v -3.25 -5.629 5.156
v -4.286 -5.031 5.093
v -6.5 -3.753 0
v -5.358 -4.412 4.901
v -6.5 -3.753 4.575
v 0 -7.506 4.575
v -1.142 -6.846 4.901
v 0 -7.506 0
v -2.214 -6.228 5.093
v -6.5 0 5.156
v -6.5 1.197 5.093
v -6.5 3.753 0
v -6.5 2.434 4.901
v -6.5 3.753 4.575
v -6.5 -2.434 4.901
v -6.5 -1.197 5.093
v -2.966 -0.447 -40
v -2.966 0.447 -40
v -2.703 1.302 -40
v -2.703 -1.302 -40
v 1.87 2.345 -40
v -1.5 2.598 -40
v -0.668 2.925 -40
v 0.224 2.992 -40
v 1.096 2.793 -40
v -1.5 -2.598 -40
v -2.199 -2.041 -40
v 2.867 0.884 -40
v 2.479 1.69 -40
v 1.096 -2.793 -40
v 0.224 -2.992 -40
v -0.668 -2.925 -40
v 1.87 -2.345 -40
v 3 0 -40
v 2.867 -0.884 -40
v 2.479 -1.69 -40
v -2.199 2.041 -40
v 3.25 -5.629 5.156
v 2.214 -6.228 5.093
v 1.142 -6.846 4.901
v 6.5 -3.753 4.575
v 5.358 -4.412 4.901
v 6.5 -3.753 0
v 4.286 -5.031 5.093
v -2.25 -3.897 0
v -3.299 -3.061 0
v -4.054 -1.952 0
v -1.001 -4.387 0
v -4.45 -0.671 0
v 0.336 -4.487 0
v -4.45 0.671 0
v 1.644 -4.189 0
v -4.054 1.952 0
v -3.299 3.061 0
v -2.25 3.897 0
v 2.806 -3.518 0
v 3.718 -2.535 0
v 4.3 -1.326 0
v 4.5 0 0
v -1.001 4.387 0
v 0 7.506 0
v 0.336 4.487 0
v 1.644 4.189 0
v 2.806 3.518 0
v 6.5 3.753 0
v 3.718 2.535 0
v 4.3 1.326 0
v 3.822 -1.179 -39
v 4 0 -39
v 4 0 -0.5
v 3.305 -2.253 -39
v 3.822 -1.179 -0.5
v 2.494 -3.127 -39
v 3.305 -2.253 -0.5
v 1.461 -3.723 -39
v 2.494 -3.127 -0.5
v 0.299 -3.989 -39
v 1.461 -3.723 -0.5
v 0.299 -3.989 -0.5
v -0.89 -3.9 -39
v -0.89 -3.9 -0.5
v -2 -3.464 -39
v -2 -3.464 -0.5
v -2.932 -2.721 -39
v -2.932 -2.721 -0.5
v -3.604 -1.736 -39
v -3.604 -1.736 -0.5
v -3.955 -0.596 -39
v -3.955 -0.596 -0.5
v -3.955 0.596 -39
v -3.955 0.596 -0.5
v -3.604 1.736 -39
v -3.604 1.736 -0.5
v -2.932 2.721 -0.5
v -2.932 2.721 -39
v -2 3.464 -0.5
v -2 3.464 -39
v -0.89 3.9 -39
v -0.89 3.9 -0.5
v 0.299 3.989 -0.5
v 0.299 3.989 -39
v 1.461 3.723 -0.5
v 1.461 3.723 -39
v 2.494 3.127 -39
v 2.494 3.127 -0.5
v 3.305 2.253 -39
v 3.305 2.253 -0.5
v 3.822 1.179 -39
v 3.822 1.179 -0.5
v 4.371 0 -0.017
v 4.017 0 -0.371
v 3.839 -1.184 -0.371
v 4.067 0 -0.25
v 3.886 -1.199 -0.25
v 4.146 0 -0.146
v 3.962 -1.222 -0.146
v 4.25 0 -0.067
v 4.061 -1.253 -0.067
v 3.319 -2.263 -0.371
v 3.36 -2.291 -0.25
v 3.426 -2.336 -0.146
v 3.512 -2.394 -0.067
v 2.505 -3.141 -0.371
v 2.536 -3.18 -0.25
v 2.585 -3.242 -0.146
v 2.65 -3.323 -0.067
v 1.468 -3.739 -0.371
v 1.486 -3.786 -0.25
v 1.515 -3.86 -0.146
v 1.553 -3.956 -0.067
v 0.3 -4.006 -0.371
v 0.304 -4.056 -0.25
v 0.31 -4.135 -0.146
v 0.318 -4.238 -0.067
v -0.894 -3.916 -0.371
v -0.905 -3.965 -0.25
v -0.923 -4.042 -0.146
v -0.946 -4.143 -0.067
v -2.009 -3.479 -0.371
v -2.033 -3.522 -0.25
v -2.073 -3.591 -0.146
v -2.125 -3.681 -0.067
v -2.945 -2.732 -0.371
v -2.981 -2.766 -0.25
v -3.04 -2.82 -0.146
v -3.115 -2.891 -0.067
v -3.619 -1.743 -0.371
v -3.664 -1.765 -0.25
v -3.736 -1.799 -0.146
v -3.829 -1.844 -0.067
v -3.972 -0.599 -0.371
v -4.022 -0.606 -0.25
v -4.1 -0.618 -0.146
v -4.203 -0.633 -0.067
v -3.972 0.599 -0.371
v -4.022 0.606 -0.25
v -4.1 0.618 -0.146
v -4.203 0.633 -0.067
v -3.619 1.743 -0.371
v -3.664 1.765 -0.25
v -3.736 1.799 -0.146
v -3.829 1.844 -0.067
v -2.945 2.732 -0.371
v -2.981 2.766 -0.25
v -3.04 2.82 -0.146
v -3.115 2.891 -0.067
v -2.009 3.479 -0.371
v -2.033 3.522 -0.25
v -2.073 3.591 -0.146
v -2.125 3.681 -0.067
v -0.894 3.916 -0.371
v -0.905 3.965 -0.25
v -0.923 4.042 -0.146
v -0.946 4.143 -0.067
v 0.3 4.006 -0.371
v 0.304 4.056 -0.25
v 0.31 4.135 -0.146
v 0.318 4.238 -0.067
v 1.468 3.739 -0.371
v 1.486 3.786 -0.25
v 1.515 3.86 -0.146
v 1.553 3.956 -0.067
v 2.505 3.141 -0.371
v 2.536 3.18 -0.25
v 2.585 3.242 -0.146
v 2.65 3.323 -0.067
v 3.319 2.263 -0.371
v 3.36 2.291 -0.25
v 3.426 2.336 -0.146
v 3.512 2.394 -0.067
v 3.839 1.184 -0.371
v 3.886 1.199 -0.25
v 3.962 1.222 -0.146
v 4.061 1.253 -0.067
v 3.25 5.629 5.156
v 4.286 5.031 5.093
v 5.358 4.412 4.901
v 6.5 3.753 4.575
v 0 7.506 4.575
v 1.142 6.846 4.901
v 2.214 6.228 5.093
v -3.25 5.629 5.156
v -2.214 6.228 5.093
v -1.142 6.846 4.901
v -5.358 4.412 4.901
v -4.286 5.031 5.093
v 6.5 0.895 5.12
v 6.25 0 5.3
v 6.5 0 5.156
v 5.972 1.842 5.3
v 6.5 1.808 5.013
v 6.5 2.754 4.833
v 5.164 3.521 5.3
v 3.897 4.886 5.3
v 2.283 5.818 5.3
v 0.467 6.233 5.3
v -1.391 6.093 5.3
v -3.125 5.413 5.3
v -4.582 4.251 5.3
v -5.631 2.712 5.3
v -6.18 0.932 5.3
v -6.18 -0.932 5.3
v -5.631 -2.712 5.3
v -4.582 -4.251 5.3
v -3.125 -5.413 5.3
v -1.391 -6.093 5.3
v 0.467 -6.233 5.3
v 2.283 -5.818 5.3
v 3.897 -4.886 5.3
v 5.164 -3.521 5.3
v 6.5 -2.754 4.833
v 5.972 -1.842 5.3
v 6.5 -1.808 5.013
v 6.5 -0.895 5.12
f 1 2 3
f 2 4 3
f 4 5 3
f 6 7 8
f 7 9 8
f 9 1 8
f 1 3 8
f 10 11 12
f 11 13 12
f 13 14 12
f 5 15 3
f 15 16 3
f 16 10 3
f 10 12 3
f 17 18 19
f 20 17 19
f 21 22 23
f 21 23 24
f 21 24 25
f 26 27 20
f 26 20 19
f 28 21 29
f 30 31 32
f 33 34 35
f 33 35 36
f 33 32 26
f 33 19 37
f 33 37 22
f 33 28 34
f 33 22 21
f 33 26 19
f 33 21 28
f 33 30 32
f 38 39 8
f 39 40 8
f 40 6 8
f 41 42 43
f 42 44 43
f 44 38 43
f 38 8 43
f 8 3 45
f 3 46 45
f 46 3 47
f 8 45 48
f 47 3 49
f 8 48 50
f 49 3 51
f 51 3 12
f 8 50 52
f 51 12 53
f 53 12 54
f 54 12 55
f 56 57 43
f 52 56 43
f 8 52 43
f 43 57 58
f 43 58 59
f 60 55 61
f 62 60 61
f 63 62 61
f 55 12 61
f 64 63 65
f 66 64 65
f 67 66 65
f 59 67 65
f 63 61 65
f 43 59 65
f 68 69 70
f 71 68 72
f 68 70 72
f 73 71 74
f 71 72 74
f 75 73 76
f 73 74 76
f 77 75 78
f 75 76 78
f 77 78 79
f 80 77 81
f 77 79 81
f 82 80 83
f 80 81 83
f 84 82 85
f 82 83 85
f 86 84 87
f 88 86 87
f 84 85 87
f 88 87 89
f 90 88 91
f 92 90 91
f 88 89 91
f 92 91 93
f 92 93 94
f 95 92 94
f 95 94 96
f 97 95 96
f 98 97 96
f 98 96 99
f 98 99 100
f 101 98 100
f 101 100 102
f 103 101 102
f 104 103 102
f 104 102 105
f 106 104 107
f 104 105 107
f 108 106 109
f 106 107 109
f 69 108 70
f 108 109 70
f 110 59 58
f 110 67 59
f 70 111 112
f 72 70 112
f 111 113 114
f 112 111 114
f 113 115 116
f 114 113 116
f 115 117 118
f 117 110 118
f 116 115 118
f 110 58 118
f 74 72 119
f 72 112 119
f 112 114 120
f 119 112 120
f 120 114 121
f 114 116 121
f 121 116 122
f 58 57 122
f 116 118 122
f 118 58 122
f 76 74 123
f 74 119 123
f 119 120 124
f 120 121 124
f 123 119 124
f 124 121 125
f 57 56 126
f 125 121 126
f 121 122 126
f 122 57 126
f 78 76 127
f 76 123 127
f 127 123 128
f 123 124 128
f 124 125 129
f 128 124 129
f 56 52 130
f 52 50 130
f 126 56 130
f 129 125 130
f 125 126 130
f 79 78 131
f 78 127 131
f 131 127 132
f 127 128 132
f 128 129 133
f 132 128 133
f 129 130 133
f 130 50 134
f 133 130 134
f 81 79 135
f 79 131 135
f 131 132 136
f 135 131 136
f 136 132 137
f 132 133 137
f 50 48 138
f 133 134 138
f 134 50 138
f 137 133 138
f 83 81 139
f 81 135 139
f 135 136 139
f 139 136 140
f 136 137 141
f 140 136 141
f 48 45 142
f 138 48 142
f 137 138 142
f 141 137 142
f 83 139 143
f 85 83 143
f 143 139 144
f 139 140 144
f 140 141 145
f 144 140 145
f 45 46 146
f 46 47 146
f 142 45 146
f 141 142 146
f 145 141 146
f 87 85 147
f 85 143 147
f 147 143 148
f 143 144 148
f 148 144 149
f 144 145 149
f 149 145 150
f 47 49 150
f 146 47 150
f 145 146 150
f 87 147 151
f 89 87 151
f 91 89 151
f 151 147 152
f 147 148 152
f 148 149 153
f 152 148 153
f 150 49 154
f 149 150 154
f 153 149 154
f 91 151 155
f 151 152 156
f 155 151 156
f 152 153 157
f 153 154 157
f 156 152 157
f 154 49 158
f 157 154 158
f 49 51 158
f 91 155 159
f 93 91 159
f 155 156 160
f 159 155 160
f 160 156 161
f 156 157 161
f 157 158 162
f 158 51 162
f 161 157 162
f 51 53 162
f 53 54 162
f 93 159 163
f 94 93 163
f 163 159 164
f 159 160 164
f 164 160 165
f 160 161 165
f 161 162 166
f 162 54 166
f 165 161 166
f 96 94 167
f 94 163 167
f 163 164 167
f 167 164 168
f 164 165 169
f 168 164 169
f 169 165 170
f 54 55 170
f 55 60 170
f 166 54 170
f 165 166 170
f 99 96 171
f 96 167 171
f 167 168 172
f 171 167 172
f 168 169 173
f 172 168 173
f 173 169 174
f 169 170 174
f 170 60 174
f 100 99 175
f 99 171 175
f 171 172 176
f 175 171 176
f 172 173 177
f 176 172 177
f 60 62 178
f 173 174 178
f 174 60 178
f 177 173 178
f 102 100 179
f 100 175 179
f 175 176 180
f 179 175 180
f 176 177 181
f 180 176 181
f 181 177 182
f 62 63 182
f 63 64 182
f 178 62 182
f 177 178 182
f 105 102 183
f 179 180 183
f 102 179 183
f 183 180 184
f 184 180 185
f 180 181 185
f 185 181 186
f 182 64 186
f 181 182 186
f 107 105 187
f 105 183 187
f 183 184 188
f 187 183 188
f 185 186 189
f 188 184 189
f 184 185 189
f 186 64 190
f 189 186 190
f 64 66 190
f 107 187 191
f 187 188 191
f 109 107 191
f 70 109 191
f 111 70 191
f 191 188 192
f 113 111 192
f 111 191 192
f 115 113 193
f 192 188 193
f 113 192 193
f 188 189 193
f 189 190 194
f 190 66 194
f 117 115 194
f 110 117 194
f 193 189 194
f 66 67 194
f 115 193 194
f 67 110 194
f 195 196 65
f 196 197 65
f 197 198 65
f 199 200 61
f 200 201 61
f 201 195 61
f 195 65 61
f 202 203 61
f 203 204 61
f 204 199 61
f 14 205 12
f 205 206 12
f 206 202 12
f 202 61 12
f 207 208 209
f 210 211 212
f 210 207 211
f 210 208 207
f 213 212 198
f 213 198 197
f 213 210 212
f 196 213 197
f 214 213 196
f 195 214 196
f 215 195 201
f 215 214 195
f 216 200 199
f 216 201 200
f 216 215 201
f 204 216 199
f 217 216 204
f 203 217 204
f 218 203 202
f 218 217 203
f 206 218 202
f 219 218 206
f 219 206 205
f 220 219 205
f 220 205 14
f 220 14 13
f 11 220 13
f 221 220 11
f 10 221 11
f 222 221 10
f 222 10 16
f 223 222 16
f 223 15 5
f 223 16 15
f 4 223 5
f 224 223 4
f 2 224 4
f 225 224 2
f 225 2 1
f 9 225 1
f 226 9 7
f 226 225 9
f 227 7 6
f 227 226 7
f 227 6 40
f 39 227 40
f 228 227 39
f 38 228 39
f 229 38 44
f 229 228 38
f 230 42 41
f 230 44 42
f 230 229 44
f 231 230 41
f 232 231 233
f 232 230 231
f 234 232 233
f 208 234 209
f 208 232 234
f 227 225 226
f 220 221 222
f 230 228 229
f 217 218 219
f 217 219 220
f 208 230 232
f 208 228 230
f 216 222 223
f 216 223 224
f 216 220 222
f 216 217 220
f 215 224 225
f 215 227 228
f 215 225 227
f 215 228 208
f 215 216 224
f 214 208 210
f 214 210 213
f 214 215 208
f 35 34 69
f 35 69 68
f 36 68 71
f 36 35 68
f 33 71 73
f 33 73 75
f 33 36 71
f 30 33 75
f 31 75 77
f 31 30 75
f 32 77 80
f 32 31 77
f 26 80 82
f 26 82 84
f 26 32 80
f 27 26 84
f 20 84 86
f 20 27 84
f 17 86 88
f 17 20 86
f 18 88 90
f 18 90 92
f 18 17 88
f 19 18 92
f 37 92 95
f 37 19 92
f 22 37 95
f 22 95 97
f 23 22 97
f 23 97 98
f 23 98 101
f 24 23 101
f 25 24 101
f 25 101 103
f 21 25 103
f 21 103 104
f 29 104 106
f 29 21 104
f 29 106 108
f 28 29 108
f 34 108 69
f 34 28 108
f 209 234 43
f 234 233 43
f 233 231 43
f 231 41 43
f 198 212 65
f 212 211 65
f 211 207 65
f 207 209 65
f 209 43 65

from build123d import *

# Parameters (mm, degrees)
EXTRUDE_1_DEPTH     = 5.3
SKETCH_2_OUTSIDE_W  = 61.562
SKETCH_2_OUTSIDE_H  = 63.574
SKETCH_2_OUTSIDE_R  = 6.25
CUT_EXTRUDE_1_DEPTH = 12.254924848
CUT_EXTRUDE_1_DRAFT = -60
SKETCH_3_R          = 4
EXTRUDE_2_DEPTH     = 40
CHAMFER_1_SIZE      = 1
FILLET_1_R          = 0.5


with BuildPart() as part:
    # Эскиз1 → Бобышка-Вытянуть1 (new body)
    with BuildSketch(Plane.XY):
        Polygon((0, 7.505553499), (-6.5, 3.75277675), (-6.5, -3.75277675), (0, -7.505553499), (6.5, -3.75277675), (6.5, 3.75277675), align=None)
    extrude(amount=EXTRUDE_1_DEPTH)


with BuildPart() as cut_extrude_1_tool:
    # Эскиз2 outside → Вырез-Вытянуть1 (with draft: the straight prism first)
    with BuildSketch(Plane.XY.offset(5.3)):
        Rectangle(SKETCH_2_OUTSIDE_W, SKETCH_2_OUTSIDE_H)
        Circle(SKETCH_2_OUTSIDE_R, mode=Mode.SUBTRACT)
    extrude(amount=-CUT_EXTRUDE_1_DEPTH)
    # Вырез-Вытянуть1: the draft: its side faces are tilted about the plane it starts from
    cut_extrude_1_sides = [cut_extrude_1_tool.faces().sort_by_distance(p)[0] for p in [
        (0, -31.787, -0.827462424),
        (30.781, 0, -0.827462424),
        (0, 31.787, -0.827462424),
        (-30.781, 0, -0.827462424),
        (-6.25, 0, -0.827462424),
    ]]
    draft(cut_extrude_1_sides, Plane.XY.offset(5.3), CUT_EXTRUDE_1_DRAFT)


with BuildPart() as part_1:
    add(part.part)

    # Вырез-Вытянуть1: cut by cut_extrude_1_tool
    add(cut_extrude_1_tool.part, mode=Mode.SUBTRACT)

    # Эскиз3 → Бобышка-Вытянуть2 (add)
    with BuildSketch(Plane(origin=(0, 0, 0), x_dir=(-1, 0, 0), z_dir=(0, 0, -1))):
        with Locations(Location((0, 0, 0), (0, 0, 180))):
            Circle(SKETCH_3_R)
    extrude(amount=EXTRUDE_2_DEPTH)

    # Фаска1
    chamfer_1_edges = [part_1.edges().sort_by_distance(p)[0] for p in [
        (-4, 0, -40),
    ]]
    chamfer(chamfer_1_edges, length=CHAMFER_1_SIZE)

    # Скругление1
    fillet_1_edges = [part_1.edges().sort_by_distance(p)[0] for p in [
        (-4, 0, 0),
    ]]
    fillet(fillet_1_edges, radius=FILLET_1_R)


solid = part_1.part
